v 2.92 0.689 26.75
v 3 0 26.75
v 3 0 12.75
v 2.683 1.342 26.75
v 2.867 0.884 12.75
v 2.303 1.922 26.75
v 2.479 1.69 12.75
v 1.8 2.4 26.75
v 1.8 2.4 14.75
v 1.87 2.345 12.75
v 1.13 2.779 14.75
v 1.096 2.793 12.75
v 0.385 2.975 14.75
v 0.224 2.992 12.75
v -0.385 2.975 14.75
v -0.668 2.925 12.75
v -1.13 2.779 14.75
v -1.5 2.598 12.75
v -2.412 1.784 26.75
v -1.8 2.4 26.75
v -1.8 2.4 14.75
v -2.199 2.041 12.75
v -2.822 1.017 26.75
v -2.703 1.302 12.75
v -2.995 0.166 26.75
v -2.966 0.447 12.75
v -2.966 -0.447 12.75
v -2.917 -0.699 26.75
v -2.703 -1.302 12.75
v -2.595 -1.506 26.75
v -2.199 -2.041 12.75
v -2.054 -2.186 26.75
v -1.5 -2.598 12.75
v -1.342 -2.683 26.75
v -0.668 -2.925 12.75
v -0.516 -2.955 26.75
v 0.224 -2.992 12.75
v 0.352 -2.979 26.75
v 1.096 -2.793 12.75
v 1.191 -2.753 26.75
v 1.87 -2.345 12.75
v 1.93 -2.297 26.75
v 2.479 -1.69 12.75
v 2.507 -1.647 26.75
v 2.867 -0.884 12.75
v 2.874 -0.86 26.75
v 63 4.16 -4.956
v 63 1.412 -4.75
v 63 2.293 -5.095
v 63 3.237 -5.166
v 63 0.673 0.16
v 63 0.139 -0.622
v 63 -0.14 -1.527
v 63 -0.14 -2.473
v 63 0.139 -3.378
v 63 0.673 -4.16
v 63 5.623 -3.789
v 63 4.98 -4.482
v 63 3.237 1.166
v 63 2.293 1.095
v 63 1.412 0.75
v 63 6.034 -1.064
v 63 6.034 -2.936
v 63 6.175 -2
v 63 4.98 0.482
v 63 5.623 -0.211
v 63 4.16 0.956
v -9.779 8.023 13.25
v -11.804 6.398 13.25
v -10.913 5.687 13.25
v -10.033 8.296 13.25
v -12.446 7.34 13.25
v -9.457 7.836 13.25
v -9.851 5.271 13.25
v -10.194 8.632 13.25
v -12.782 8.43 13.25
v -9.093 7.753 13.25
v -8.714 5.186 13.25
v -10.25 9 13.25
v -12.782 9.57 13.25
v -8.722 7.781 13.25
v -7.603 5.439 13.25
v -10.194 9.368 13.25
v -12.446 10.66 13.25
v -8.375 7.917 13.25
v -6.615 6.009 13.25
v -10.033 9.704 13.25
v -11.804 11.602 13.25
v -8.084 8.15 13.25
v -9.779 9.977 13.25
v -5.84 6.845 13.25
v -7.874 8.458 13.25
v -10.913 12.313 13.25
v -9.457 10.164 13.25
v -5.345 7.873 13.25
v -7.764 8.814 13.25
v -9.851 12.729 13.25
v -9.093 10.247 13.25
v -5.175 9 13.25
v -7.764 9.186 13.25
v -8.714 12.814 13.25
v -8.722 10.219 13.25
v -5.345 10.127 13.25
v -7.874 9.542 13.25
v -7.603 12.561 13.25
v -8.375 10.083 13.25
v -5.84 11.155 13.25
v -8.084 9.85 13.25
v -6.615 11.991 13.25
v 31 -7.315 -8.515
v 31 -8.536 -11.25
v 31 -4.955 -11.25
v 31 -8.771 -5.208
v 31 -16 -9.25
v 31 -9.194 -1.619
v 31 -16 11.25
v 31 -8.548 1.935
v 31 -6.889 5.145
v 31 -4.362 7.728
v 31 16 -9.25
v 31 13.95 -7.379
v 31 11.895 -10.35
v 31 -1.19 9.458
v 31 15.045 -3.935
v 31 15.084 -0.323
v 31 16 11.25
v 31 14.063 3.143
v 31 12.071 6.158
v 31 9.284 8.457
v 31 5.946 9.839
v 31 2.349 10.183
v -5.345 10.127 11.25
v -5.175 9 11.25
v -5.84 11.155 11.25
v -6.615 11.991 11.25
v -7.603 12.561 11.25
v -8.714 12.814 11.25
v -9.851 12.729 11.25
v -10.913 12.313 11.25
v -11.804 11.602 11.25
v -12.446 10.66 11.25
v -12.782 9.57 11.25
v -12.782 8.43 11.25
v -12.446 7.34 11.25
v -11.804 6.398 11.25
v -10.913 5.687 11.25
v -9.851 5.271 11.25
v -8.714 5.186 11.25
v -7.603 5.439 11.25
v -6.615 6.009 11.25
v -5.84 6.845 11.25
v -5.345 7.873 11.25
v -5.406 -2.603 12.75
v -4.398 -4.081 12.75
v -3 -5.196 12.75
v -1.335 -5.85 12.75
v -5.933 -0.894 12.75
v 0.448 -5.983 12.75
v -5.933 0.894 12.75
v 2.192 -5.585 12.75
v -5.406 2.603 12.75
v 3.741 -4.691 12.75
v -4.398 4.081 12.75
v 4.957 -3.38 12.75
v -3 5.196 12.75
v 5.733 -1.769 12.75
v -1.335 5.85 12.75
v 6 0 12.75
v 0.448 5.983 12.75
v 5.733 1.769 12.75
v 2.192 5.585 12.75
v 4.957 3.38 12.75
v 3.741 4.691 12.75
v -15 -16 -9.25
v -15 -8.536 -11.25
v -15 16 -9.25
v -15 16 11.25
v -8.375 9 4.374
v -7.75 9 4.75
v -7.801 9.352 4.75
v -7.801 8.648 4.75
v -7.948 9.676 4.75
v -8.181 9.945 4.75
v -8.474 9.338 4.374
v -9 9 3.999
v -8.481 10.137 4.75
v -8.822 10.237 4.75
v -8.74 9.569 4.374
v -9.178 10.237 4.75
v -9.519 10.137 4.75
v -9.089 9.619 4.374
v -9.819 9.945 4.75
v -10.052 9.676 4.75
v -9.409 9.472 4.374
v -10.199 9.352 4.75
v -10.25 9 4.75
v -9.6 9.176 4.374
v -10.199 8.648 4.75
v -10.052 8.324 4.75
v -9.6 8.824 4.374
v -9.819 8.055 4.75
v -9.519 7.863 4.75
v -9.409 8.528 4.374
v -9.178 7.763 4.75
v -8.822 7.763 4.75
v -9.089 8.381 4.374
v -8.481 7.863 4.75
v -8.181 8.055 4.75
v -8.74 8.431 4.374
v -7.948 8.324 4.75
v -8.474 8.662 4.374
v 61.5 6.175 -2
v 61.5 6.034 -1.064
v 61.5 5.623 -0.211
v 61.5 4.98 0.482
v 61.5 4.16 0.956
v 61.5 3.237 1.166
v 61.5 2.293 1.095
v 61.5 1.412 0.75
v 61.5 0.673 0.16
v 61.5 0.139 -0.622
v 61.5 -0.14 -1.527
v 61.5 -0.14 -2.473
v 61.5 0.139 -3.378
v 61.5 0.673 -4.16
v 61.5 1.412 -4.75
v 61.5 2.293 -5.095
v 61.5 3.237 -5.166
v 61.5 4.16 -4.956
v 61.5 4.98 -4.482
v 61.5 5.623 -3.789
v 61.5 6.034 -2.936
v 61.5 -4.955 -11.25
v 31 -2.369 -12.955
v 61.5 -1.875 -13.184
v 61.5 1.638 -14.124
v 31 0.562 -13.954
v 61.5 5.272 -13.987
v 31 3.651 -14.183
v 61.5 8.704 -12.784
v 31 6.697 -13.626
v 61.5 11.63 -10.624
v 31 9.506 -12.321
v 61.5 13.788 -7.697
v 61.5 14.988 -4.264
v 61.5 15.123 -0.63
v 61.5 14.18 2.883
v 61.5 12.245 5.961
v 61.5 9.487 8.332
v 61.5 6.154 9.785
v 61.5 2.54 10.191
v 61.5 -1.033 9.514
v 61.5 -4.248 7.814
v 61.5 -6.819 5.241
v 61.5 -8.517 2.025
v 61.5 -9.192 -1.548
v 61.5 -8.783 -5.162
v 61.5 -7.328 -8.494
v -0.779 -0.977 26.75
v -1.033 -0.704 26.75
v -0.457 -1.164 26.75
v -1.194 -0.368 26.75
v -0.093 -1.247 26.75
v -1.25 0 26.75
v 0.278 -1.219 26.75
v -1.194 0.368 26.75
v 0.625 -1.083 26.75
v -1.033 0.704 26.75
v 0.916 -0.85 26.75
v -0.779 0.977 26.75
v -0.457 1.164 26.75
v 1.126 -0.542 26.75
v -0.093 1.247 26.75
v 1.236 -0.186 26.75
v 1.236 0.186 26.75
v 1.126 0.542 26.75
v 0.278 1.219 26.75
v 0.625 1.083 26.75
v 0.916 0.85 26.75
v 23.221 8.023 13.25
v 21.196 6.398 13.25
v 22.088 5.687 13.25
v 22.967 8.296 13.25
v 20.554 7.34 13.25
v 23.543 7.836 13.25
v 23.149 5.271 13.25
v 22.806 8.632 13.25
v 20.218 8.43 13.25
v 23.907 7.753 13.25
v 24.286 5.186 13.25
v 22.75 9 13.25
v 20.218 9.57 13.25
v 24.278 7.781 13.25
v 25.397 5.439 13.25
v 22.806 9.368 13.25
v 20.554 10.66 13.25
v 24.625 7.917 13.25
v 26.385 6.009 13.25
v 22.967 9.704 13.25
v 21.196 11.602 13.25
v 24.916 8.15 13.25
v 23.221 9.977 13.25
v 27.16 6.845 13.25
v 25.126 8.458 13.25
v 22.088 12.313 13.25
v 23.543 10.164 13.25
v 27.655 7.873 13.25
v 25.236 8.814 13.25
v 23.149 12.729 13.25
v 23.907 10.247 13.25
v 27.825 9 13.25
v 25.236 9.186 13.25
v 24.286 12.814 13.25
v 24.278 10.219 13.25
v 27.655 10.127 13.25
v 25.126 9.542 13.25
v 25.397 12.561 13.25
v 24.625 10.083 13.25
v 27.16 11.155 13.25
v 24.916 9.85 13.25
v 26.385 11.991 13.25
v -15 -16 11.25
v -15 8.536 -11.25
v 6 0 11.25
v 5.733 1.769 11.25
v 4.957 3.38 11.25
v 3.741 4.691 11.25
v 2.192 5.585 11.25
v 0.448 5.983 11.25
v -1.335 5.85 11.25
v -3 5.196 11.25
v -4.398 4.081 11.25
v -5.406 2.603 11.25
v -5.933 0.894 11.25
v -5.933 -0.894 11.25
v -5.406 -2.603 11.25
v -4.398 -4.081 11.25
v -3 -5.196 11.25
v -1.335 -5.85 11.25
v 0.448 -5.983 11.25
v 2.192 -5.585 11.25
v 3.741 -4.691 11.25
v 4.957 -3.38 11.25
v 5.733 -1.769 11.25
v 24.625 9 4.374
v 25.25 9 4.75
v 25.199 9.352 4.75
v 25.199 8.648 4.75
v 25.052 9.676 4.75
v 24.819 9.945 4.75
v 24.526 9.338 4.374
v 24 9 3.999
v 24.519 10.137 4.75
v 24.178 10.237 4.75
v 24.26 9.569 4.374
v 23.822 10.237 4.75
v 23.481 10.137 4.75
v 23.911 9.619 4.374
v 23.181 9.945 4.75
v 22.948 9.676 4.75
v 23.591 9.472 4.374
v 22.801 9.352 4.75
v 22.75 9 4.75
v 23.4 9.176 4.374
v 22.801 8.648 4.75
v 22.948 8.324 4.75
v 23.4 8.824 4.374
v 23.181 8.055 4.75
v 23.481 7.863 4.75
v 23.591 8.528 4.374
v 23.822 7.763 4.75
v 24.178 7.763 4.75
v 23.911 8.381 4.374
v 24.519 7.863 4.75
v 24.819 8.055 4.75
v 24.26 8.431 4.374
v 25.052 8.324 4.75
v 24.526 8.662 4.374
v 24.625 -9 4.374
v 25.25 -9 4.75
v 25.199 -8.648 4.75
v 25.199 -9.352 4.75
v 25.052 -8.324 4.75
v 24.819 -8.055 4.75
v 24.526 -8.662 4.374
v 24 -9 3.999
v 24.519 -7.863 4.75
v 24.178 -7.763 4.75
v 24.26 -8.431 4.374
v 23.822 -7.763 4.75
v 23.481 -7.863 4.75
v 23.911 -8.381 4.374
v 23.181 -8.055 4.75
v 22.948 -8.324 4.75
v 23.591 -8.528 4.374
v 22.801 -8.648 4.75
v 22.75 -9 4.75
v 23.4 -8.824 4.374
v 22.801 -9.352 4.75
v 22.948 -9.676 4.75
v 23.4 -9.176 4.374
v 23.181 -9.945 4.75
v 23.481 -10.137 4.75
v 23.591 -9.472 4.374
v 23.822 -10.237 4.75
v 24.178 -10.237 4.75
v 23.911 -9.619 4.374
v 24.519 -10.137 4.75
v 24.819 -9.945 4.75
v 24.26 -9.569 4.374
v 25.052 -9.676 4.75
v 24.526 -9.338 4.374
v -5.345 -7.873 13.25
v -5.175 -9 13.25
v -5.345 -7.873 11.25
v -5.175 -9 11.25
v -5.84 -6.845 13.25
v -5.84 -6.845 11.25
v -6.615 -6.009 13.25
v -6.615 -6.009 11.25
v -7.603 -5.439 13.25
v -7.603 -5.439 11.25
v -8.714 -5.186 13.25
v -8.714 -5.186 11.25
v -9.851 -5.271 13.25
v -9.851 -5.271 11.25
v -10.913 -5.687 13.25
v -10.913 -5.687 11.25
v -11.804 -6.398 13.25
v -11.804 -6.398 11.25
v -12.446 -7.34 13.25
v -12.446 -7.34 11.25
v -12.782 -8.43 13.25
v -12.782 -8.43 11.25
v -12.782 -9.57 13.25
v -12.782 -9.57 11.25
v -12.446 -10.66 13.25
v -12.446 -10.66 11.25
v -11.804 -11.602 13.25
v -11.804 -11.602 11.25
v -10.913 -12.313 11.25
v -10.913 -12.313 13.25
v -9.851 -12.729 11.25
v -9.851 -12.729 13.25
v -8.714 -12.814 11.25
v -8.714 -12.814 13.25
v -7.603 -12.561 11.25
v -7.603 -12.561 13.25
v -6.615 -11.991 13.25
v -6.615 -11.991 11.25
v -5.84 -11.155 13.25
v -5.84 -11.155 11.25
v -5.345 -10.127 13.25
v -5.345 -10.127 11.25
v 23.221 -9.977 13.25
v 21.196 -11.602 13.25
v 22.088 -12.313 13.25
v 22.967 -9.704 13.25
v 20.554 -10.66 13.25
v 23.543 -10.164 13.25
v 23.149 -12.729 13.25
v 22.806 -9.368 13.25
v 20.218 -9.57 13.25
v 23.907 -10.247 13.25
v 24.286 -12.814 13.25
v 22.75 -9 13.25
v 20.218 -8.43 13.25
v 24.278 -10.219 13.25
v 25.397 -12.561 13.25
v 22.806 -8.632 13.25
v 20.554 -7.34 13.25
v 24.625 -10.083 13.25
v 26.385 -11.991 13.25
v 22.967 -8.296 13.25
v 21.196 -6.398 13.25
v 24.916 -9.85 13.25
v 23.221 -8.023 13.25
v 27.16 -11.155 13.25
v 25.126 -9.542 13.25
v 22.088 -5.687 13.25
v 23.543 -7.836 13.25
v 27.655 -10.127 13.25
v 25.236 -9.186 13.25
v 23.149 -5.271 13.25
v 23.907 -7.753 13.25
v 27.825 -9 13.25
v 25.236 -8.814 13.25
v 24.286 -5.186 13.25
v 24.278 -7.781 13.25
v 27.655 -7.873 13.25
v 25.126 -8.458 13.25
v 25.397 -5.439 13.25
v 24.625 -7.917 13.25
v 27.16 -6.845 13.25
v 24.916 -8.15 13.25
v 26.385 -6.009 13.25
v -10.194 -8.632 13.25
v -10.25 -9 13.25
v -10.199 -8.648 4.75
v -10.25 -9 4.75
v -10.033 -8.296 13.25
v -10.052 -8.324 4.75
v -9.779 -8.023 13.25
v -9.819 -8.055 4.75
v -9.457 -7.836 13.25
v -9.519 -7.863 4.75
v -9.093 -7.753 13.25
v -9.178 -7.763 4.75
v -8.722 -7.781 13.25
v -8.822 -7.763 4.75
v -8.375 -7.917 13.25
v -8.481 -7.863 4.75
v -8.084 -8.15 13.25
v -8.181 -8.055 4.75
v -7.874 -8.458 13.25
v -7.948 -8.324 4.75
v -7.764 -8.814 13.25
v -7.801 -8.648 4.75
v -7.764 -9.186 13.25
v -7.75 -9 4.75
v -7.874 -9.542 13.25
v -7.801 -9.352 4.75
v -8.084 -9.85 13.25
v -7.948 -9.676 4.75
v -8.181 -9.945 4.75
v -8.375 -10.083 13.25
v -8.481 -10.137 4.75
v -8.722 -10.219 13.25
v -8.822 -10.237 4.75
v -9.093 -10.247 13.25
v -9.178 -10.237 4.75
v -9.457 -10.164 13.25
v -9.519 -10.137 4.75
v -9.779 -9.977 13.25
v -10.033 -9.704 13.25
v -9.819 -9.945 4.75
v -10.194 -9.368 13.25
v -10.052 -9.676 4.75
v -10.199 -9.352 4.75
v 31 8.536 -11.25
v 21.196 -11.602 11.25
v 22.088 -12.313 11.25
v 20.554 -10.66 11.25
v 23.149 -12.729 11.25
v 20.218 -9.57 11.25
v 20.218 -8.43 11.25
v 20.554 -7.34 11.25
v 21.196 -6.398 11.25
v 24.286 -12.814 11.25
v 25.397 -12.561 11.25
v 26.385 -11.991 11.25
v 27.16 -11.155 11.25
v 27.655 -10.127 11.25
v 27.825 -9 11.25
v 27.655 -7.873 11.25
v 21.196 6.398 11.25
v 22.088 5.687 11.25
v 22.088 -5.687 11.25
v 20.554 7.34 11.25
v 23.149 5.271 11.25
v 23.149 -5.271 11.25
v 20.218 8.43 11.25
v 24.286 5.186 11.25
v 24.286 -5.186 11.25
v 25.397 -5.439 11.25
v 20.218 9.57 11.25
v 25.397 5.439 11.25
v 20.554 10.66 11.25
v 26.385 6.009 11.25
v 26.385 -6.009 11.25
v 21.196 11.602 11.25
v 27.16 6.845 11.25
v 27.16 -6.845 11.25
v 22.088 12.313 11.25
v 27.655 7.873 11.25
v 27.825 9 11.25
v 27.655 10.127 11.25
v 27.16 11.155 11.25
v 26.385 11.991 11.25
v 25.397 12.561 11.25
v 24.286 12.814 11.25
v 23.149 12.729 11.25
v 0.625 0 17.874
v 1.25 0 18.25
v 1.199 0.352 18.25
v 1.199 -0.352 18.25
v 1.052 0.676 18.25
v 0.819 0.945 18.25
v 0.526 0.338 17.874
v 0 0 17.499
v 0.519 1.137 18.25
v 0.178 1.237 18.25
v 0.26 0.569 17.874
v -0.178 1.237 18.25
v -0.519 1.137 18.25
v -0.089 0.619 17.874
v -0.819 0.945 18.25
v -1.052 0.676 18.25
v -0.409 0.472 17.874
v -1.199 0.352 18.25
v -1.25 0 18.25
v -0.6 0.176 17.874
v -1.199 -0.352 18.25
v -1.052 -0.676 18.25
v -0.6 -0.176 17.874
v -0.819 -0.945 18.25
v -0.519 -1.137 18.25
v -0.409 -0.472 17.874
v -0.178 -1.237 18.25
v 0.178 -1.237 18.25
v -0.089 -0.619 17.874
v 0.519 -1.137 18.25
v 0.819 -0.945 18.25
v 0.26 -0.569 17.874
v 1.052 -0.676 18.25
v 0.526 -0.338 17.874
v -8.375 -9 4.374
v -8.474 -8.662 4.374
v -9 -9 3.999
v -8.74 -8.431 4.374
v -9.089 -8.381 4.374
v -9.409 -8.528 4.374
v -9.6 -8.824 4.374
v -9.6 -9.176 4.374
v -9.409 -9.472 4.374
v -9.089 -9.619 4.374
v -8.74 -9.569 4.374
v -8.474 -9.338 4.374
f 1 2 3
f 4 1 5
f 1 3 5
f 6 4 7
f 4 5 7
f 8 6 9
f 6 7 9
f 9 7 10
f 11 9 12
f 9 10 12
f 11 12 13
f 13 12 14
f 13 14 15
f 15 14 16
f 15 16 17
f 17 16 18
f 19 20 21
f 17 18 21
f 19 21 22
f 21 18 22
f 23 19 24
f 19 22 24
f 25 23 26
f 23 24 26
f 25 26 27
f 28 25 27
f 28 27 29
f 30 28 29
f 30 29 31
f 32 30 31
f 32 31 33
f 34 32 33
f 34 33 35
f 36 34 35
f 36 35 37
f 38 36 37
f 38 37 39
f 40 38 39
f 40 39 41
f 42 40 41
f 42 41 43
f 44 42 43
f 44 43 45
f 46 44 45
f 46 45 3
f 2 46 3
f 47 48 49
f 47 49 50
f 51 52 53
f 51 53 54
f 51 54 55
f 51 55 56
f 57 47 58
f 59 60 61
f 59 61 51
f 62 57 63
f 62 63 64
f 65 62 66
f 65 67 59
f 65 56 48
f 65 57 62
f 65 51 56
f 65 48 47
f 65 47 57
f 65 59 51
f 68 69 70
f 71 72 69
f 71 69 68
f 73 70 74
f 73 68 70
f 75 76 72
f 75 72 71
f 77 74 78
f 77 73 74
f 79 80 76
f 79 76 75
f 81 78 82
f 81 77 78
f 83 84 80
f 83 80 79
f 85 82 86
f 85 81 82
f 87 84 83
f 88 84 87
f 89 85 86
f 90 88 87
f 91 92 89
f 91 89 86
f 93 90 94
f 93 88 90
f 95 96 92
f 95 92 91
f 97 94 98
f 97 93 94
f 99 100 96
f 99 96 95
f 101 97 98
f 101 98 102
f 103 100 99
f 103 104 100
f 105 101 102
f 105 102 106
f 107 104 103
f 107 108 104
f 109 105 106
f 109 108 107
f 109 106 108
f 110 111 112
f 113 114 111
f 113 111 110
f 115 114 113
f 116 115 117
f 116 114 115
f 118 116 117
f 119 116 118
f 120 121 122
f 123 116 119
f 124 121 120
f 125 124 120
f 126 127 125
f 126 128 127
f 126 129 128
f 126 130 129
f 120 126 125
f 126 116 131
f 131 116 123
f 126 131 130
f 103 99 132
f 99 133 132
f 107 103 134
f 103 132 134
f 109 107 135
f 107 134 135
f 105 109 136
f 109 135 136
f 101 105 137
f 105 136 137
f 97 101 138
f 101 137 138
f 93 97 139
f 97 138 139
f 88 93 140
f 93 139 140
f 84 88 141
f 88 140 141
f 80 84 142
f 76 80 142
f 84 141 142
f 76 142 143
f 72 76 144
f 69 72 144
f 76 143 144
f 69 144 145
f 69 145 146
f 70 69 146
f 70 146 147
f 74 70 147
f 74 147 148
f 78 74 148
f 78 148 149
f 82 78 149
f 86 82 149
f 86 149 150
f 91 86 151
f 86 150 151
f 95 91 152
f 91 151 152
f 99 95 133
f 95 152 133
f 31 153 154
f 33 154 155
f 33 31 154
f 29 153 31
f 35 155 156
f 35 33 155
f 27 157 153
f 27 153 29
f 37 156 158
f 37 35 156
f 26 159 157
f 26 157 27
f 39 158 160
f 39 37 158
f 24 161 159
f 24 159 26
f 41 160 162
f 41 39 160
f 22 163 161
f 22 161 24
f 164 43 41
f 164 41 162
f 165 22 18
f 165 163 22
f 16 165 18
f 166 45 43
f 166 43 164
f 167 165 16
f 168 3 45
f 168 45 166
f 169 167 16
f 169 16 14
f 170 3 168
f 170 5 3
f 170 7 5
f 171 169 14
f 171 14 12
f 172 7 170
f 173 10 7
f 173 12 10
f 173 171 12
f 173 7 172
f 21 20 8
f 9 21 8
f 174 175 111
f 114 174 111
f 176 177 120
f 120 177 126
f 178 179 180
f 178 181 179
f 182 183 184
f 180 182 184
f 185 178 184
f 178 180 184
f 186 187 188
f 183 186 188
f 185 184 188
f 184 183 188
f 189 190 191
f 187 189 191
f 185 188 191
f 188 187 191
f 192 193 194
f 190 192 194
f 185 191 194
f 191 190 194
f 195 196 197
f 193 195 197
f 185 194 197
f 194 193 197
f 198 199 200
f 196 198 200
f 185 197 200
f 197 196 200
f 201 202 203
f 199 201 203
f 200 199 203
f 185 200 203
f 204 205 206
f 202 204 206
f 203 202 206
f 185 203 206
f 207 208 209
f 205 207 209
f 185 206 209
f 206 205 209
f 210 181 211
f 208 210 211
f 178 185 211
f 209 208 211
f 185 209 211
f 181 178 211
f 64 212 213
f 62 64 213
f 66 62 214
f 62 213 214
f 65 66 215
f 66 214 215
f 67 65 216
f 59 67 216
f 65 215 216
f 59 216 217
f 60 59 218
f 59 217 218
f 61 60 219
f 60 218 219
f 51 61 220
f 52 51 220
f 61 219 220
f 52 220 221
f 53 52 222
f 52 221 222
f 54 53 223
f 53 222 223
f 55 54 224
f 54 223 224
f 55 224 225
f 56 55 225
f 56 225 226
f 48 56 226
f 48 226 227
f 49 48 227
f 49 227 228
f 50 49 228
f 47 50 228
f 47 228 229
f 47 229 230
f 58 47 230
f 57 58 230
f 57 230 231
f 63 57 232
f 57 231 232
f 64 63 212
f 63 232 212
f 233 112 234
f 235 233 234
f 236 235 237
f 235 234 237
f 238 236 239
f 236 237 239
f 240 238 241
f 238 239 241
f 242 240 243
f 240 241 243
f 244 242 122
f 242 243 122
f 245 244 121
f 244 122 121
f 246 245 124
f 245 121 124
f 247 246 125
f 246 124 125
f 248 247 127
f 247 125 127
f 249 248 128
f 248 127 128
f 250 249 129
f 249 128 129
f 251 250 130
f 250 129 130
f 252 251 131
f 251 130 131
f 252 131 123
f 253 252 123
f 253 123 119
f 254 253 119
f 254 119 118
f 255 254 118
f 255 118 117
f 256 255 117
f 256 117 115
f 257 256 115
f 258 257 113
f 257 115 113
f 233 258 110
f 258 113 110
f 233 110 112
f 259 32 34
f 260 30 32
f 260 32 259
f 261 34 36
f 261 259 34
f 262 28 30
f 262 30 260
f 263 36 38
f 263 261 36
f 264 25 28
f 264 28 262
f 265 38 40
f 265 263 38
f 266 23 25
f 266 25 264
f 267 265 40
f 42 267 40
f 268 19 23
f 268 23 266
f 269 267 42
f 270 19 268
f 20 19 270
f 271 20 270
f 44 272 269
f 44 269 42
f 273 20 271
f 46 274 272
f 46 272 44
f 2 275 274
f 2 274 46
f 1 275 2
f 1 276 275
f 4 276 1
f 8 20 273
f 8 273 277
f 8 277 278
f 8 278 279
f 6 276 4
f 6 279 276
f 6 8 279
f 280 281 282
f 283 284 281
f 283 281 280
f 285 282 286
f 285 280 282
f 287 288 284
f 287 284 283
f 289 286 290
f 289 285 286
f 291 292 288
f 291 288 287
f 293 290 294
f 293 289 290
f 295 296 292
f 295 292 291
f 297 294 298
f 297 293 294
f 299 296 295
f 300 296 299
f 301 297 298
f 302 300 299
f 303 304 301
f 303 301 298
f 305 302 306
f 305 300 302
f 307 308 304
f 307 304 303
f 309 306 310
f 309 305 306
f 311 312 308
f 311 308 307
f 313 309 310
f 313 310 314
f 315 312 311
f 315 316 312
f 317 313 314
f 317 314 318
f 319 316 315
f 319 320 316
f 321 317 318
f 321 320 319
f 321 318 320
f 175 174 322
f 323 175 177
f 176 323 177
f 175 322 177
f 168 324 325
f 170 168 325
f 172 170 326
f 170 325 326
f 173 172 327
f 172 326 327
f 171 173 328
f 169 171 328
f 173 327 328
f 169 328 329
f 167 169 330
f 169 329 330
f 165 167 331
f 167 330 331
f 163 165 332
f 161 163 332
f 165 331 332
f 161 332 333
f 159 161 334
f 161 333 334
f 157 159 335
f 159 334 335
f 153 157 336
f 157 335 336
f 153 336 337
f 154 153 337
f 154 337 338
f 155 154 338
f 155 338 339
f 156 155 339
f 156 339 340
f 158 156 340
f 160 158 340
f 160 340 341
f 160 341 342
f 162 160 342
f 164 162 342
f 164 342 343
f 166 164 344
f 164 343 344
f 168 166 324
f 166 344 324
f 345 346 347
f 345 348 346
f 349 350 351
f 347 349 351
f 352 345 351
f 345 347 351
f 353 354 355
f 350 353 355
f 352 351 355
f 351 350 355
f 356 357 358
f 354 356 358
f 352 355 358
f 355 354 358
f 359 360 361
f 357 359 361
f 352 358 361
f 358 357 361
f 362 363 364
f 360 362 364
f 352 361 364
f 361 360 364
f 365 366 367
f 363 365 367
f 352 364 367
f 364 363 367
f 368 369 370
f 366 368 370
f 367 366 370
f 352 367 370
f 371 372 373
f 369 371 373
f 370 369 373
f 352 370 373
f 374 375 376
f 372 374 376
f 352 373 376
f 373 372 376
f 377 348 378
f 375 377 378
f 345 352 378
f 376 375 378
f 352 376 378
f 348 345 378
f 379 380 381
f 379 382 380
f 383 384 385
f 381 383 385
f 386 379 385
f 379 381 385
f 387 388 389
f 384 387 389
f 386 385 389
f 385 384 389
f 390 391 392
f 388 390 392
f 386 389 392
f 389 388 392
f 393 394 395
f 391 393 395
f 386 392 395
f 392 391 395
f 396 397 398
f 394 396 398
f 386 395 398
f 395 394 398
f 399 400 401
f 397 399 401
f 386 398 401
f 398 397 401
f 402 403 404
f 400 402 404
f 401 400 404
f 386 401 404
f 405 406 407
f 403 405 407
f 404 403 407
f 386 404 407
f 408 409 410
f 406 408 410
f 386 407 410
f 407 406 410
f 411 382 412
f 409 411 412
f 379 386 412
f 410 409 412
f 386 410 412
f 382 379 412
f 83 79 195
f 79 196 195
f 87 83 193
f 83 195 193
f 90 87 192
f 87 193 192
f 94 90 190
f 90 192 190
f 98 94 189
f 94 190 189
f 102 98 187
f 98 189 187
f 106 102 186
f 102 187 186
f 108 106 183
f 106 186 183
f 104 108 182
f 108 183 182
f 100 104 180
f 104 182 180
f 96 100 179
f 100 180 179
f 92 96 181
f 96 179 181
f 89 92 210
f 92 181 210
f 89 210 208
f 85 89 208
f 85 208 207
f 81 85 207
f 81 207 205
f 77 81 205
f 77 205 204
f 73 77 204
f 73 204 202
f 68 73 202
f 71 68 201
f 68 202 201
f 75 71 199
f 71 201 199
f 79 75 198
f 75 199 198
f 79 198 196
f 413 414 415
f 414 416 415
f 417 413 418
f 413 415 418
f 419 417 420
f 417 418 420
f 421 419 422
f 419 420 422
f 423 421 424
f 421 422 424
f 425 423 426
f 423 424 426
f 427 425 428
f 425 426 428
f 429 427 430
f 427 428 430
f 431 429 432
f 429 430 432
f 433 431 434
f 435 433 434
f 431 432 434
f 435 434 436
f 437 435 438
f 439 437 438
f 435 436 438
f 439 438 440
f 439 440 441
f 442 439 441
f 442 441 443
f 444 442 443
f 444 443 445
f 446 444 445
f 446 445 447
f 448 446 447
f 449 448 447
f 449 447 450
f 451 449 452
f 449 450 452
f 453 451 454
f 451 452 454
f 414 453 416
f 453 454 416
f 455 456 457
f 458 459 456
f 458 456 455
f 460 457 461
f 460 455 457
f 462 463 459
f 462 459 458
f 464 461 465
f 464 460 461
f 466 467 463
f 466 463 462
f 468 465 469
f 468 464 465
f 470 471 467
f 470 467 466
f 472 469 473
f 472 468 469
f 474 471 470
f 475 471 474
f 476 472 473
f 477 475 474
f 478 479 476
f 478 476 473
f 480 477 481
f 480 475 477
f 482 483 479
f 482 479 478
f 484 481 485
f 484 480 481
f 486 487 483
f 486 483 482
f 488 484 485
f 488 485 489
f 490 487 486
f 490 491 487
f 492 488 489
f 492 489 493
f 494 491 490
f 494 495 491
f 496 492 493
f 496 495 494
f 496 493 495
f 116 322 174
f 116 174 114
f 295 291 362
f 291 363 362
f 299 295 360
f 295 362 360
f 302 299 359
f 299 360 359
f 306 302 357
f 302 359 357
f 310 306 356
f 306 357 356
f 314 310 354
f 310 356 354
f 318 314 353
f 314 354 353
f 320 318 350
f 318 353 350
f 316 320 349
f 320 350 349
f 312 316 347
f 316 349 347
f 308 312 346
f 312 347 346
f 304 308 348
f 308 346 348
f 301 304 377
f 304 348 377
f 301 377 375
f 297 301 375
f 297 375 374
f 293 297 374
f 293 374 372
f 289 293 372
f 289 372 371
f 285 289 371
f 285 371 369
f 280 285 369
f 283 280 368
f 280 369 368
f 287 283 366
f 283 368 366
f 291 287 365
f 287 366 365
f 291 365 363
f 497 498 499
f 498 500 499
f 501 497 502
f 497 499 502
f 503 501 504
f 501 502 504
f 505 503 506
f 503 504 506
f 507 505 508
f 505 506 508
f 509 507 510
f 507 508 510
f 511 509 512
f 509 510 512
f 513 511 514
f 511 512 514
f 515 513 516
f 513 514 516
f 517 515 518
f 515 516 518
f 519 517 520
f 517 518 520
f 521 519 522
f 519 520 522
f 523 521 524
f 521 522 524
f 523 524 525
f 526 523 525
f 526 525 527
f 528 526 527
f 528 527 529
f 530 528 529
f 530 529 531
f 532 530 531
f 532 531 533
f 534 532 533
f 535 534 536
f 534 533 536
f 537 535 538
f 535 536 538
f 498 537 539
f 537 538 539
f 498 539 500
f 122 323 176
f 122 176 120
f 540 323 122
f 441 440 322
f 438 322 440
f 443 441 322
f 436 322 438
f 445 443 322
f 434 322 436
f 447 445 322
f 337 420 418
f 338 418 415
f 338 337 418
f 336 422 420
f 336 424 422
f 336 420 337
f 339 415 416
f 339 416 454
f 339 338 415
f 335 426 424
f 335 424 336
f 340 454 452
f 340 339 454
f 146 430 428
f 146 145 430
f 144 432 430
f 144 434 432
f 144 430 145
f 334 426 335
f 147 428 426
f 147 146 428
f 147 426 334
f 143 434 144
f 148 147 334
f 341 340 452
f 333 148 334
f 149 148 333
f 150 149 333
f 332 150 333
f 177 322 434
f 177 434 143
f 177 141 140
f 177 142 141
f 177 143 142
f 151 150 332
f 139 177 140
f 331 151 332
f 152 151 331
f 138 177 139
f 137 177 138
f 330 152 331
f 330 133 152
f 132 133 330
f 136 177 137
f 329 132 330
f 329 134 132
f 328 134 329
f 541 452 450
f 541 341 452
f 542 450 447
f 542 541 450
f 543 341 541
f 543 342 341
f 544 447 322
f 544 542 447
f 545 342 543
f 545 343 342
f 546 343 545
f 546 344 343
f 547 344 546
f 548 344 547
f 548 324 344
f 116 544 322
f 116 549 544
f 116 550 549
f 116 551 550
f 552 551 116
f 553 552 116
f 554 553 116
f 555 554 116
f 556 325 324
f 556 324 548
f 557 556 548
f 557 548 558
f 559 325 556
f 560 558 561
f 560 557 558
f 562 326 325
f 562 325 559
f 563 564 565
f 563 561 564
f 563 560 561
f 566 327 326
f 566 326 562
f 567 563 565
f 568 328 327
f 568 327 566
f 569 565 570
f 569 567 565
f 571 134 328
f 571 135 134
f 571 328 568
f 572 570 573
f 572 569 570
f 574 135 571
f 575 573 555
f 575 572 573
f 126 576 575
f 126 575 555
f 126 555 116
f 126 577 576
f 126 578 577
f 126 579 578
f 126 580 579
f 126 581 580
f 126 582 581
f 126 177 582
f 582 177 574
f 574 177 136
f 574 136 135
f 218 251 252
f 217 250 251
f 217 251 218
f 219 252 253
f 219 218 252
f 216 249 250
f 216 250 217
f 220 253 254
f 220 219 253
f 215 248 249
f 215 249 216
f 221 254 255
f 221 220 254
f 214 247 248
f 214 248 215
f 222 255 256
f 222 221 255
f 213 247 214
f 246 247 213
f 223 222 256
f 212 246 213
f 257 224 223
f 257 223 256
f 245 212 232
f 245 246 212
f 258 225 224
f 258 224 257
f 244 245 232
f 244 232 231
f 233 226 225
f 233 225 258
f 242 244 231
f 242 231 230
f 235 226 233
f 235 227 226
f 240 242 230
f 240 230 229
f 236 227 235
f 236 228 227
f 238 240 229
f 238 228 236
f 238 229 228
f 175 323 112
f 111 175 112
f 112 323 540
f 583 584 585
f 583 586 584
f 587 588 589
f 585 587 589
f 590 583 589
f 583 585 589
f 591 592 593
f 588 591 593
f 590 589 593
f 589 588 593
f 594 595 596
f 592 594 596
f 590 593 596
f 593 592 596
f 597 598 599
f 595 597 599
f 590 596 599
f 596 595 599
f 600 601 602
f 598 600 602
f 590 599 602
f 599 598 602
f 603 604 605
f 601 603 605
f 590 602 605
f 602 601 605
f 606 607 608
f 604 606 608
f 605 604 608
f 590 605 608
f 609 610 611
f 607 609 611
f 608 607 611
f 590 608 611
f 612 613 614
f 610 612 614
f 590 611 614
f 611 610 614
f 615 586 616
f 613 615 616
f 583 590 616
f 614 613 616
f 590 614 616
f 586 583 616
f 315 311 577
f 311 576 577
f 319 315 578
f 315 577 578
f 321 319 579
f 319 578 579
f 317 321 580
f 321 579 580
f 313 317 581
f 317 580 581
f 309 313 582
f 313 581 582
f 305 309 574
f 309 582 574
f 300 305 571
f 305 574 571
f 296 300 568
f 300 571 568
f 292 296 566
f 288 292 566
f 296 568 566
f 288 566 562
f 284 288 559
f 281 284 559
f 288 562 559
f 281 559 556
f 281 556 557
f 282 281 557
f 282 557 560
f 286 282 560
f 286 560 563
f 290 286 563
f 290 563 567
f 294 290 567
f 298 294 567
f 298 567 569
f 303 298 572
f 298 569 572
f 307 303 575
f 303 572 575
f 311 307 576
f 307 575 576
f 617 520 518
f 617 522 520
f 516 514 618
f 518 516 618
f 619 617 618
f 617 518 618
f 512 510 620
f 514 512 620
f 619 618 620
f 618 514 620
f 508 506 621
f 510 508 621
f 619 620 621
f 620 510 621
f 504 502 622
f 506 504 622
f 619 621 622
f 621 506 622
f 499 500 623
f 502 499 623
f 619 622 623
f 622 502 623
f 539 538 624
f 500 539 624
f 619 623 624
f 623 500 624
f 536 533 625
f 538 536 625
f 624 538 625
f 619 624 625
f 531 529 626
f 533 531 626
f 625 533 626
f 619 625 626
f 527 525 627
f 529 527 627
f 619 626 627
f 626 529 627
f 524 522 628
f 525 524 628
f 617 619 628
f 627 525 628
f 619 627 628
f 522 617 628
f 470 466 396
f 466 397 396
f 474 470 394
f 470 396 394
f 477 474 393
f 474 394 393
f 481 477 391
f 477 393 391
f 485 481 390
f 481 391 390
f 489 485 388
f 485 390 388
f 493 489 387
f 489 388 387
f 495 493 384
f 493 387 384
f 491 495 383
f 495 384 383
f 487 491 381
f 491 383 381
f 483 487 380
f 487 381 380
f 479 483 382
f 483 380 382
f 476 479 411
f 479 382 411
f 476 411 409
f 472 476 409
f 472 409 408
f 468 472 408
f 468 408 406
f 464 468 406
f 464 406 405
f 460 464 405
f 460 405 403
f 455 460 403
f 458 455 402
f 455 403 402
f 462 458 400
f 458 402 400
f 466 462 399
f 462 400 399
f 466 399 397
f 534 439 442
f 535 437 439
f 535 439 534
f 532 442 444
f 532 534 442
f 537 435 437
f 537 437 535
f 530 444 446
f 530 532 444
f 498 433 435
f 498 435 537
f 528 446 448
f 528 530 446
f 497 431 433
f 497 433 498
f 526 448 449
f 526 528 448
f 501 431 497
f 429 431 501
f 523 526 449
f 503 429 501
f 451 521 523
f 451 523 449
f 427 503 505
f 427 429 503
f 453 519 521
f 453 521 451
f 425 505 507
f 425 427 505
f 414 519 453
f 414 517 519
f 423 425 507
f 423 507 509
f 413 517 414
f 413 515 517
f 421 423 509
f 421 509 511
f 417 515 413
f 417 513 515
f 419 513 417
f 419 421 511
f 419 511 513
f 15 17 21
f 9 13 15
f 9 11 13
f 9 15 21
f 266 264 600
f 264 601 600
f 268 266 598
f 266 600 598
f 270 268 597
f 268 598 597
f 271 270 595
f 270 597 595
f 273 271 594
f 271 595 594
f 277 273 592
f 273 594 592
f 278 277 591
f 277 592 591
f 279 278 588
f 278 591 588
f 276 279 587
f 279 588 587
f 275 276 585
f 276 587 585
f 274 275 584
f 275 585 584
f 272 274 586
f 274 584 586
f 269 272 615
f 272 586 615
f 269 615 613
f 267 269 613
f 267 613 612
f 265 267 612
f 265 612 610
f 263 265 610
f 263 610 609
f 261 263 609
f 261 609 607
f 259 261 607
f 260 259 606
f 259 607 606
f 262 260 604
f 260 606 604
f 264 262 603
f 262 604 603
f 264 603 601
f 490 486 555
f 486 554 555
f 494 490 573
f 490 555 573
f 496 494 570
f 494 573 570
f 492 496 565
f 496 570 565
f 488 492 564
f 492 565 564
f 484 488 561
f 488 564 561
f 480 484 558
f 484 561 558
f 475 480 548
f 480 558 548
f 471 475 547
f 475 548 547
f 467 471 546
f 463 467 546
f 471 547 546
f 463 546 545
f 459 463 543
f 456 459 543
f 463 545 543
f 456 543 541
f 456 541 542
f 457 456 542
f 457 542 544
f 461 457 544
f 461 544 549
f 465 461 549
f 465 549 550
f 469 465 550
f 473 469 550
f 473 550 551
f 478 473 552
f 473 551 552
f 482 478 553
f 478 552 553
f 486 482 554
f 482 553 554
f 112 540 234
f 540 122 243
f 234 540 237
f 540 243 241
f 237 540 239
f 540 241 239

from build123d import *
from OCP.BRepFilletAPI import BRepFilletAPI_MakeChamfer

# Parameters (mm, degrees)
SKETCH3_W             = 46
SKETCH3_H             = 32
BOSS_EXTRUDE1_DEPTH   = 11.25
SKETCH5_R             = 6
SKETCH5_R_2           = 3.825
BOSS_EXTRUDE2_DEPTH   = 1.5
MOVE_FACE1_BY         = 0.5
MOVE_FACE1_2_BY       = 0.5
MOVE_FACE1_3_BY       = 0.5
MOVE_FACE1_4_BY       = 0.5
SKETCH6_R             = 3
BOSS_EXTRUDE3_DEPTH   = 14
SKETCH7_W             = 3.6
SKETCH7_H             = 0.6
CUT_EXTRUDE1_DEPTH    = 12
M3_TAPPED_HOLE1_D     = 2.5
M3_TAPPED_HOLE1_DEPTH = 8.5
M3_TAPPED_HOLE1_TIP   = 0.751075774
M3_TAPPED_HOLE2_D     = 2.5
M3_TAPPED_HOLE2_DEPTH = 8.5
M3_TAPPED_HOLE2_TIP   = 0.751075774
CHAMFER1_SIZE         = 2
CHAMFER1_SIZE2        = 7.464101615
SKETCH13_R            = 12.2
BOSS_EXTRUDE4_DEPTH   = 30.5
SKETCH14_R            = 3.175
BOSS_EXTRUDE6_DEPTH   = 1.5


with BuildPart() as part:
    # Sketch3 → Boss-Extrude1 (new, symmetric)
    with BuildSketch(Plane.XY):
        with Locations((8, 0)):
            Rectangle(SKETCH3_W, SKETCH3_H)
    extrude(amount=BOSS_EXTRUDE1_DEPTH, both=True)

    # Sketch5 → Boss-Extrude2 (add)
    with BuildSketch(Plane.XY.offset(11.25)):
        Circle(SKETCH5_R)
        with Locations((-9, 9)):
            Circle(SKETCH5_R_2)
        with Locations((-9, -9)):
            Circle(SKETCH5_R_2)
        with Locations((24, 9)):
            Circle(SKETCH5_R_2)
        with Locations((24, -9)):
            Circle(SKETCH5_R_2)
    extrude(amount=BOSS_EXTRUDE2_DEPTH)

    # Move Face1: a face moved outward by 0.5
    extrude(part.faces().sort_by_distance((24, -9, 12.75))[0], amount=MOVE_FACE1_BY, dir=(0, 0, 1))

    # Move Face1 2: a face moved outward by 0.5
    extrude(part.faces().sort_by_distance((24, 9, 12.75))[0], amount=MOVE_FACE1_2_BY, dir=(0, 0, 1))

    # Move Face1 3: a face moved outward by 0.5
    extrude(part.faces().sort_by_distance((-9, -9, 12.75))[0], amount=MOVE_FACE1_3_BY, dir=(0, 0, 1))

    # Move Face1 4: a face moved outward by 0.5
    extrude(part.faces().sort_by_distance((-9, 9, 12.75))[0], amount=MOVE_FACE1_4_BY, dir=(0, 0, 1))

    # Sketch6 → Boss-Extrude3 (add)
    with BuildSketch(Plane.XY.offset(12.75)):
        Circle(SKETCH6_R)
    extrude(amount=BOSS_EXTRUDE3_DEPTH)

    # Sketch7 → Cut-Extrude1 (cut)
    with BuildSketch(Plane.XY.offset(26.75)):
        with Locations((0, 2.7)):
            Rectangle(SKETCH7_W, SKETCH7_H)
    extrude(amount=-CUT_EXTRUDE1_DEPTH, mode=Mode.SUBTRACT)

    # M3 Tapped Hole1
    with Locations(Plane.XY.offset(13.25)):
        with Locations((-9, 9), (-9, -9), (24, 9), (24, -9)):
            Hole(M3_TAPPED_HOLE1_D / 2, depth=M3_TAPPED_HOLE1_DEPTH)
            with Locations((0, 0, -(M3_TAPPED_HOLE1_DEPTH + M3_TAPPED_HOLE1_TIP / 2))):  # 118° drill point
                Cone(0, M3_TAPPED_HOLE1_D / 2, M3_TAPPED_HOLE1_TIP, mode=Mode.SUBTRACT)

    # M3 Tapped Hole2
    with Locations(Plane.XY.offset(26.75)):
        with Locations((0, 0)):
            Hole(M3_TAPPED_HOLE2_D / 2, depth=M3_TAPPED_HOLE2_DEPTH)
            with Locations((0, 0, -(M3_TAPPED_HOLE2_DEPTH + M3_TAPPED_HOLE2_TIP / 2))):  # 118° drill point
                Cone(0, M3_TAPPED_HOLE2_D / 2, M3_TAPPED_HOLE2_TIP, mode=Mode.SUBTRACT)

    # Chamfer1: one chamfer whose edges measure the first distance from different faces: ONE call of the kernel's chamfer builder (chamfer() names one face for all edges)
    chamfer1_edges_1 = [part.edges().sort_by_distance(p)[0] for p in [
        (8, 16, -11.25),
    ]]
    chamfer1_side_1 = [part.faces().sort_by_distance(p)[0] for p in [
        (8, 16, 0),
    ]]
    chamfer1_edges_2 = [part.edges().sort_by_distance(p)[0] for p in [
        (8, -16, -11.25),
    ]]
    chamfer1_side_2 = [part.faces().sort_by_distance(p)[0] for p in [
        (8, -16, 0),
    ]]
    chamfer1 = BRepFilletAPI_MakeChamfer(part.part.solid().wrapped)
    for e in chamfer1_edges_1:
        chamfer1.Add(CHAMFER1_SIZE, CHAMFER1_SIZE2, e.wrapped, chamfer1_side_1[0].wrapped)  # the first distance lies on this face
    for e in chamfer1_edges_2:
        chamfer1.Add(CHAMFER1_SIZE, CHAMFER1_SIZE2, e.wrapped, chamfer1_side_2[0].wrapped)  # the first distance lies on this face
    add(Compound.cast(chamfer1.Shape()), mode=Mode.REPLACE)

    # Sketch13 → Boss-Extrude4 (add)
    with BuildSketch(Plane(origin=(31, 0, 0), x_dir=(0, 0, -1), z_dir=(1, 0, 0))):
        with Locations(Location((2, 3, 0), (0, 0, 319.305481692))):
            Circle(SKETCH13_R)
    extrude(amount=BOSS_EXTRUDE4_DEPTH)

    # Sketch14 → Boss-Extrude6 (add)
    with BuildSketch(Plane(origin=(61.5, 0, 0), x_dir=(0, 0, -1), z_dir=(1, 0, 0))):
        with Locations(Location((2, 3, 0), (0, 0, 90))):
            Circle(SKETCH14_R)
    extrude(amount=BOSS_EXTRUDE6_DEPTH)


solid = part.part
